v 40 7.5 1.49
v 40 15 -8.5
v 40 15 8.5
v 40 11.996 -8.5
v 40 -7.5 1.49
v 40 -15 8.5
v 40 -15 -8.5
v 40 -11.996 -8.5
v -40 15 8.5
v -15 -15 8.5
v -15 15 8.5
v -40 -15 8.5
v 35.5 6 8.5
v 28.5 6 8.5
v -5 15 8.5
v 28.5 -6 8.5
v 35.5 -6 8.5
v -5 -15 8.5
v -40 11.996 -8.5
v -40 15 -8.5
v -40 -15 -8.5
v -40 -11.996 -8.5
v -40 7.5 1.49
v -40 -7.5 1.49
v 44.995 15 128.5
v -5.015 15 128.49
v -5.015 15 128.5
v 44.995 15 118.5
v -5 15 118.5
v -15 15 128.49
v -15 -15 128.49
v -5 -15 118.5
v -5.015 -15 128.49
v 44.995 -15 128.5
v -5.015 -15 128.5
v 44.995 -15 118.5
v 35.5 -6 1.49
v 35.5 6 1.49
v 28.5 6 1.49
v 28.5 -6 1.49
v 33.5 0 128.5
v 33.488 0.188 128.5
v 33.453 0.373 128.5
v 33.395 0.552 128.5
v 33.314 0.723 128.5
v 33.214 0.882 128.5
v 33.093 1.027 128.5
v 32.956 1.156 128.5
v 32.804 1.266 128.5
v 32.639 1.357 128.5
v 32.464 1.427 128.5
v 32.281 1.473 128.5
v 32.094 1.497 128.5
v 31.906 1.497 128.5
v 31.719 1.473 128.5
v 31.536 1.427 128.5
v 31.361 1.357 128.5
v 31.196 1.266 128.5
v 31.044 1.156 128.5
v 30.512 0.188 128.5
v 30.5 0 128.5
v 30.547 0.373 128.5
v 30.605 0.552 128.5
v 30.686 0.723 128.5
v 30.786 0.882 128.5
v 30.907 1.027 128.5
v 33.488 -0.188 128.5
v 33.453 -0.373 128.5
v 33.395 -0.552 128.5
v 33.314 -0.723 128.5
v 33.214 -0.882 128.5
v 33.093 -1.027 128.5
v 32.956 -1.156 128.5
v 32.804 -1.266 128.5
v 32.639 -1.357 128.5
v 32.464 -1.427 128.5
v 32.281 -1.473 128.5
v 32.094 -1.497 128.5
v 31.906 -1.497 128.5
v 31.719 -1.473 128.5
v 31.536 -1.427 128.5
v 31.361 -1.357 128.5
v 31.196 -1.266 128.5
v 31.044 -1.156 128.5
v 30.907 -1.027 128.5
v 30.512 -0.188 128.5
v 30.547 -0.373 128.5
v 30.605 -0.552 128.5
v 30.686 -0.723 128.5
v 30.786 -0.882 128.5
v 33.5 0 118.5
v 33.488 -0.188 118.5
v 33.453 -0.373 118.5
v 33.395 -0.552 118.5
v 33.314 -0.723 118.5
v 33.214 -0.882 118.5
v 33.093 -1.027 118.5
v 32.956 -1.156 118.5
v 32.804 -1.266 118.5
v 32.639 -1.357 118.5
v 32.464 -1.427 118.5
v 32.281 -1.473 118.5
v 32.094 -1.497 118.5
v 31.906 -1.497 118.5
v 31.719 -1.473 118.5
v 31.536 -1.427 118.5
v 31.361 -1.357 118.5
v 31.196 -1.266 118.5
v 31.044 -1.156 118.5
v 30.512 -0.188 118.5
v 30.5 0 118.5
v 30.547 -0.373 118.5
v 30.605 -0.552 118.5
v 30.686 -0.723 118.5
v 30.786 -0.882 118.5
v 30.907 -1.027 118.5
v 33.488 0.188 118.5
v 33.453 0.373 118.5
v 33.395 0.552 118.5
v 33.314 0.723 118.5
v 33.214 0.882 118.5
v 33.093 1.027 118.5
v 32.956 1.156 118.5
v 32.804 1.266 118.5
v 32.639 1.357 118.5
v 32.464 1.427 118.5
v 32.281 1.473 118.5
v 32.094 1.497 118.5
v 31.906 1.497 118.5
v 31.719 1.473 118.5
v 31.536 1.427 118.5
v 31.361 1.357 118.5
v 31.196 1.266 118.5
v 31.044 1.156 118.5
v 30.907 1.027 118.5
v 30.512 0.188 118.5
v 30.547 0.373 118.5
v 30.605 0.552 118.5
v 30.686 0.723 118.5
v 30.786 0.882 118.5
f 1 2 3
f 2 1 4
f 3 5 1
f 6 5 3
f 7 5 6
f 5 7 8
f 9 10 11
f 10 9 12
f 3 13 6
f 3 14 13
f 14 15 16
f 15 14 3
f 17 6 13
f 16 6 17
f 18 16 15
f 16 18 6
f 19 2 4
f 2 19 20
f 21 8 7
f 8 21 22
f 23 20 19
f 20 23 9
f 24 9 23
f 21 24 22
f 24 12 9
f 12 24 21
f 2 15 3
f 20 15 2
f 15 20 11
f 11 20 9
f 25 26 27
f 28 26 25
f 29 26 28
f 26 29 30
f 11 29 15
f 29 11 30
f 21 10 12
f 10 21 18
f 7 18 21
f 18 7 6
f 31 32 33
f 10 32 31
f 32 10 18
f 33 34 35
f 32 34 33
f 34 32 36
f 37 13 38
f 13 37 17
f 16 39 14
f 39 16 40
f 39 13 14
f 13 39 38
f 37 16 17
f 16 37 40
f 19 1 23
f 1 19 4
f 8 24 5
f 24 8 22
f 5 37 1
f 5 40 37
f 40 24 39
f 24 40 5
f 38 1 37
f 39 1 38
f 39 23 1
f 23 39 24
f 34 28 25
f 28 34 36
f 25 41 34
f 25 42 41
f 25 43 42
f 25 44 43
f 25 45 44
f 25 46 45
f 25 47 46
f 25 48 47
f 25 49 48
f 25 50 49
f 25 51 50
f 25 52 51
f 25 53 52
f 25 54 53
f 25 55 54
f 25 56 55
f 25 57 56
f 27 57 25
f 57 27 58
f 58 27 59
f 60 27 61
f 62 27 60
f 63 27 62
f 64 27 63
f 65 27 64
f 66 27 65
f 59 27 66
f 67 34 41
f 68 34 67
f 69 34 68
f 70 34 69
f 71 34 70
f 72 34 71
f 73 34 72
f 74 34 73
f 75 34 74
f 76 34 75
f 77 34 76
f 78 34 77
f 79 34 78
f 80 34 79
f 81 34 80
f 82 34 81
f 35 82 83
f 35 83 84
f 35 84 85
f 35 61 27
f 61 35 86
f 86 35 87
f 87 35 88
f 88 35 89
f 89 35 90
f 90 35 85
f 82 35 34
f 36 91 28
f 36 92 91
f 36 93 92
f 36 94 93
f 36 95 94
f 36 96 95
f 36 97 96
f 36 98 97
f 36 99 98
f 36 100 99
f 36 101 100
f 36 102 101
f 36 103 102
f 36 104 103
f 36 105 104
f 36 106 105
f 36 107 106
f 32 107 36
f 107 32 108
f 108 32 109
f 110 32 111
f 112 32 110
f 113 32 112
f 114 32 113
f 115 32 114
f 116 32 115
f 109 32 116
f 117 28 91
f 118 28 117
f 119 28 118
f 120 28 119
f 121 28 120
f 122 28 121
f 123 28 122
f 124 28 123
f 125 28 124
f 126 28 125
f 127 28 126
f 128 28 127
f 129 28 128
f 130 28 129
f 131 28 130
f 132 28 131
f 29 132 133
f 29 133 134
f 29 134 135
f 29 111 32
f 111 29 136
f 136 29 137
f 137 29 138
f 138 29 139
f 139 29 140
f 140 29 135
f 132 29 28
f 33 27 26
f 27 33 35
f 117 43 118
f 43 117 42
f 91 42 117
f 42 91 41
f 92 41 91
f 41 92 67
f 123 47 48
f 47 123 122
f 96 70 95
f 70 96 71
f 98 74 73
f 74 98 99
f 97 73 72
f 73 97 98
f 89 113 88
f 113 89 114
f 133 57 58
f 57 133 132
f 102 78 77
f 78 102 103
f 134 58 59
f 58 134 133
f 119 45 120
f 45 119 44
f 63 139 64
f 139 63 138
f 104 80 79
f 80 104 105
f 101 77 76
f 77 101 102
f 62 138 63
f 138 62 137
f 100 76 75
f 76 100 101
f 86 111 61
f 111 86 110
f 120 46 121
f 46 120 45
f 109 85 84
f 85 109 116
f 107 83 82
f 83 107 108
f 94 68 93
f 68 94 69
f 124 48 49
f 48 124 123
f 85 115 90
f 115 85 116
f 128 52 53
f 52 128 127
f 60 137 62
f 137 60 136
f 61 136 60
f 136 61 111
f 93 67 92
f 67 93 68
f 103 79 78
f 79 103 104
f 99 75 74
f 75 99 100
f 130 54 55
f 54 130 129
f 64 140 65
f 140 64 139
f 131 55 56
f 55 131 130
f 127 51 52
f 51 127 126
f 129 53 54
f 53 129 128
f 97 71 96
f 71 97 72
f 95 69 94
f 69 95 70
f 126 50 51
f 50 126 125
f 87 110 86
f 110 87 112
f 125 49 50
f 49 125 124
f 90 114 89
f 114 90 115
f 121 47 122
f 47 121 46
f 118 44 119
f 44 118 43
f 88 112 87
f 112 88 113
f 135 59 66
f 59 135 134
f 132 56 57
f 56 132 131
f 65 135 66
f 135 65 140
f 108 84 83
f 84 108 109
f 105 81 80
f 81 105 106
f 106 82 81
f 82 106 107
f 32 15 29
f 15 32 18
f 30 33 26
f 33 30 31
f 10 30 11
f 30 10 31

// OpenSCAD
base_largura            = 30;
base_comprimento        = 80;
base_altura             = 17;
furo_sensor_largura     = 12;
furo_sensor_comprimento = 07;
torre_largura           = 10;
torre_altura            = 120;
topo_comprimento        = 50;
topo_altura             = 10;

$fn=50;

module base(){   
    difference(){
        cube([base_comprimento,base_largura,base_altura], center = true);
        
        translate([base_comprimento/2 - (furo_sensor_comprimento + 1),0,1])
            cube([furo_sensor_comprimento,furo_sensor_largura,base_altura], center = true);
        
        translate([-base_comprimento/2 -1,-12,-base_altura/2 - 0.01])
        rotate(a=90,v=[1,0,0])
        rotate(a=90,v=[0,1,0])
        linear_extrude(height = base_comprimento + 2)
            polygon(points=[[0,0],[4.5,10],[19.5,10],[24,0]]);
    }    
}

module torre(){
    translate([-base_comprimento/2 + base_largura,0,torre_altura/2 + base_altura/2 - 0.01])
        cube([torre_largura,base_largura,torre_altura], center = true);
}

module topo(){
    difference(){
        translate([-base_comprimento/2 + topo_comprimento + torre_largura -0.01,0,torre_altura+3.5])
            cube([topo_comprimento+0.01,base_largura,topo_altura], center = true);
        
        translate([base_comprimento/2 - (furo_sensor_comprimento + 1),0,torre_altura+topo_altura - 7])
            cylinder(d=3, h=topo_altura+5,center=true);
    }
}


base();
torre();
topo();
